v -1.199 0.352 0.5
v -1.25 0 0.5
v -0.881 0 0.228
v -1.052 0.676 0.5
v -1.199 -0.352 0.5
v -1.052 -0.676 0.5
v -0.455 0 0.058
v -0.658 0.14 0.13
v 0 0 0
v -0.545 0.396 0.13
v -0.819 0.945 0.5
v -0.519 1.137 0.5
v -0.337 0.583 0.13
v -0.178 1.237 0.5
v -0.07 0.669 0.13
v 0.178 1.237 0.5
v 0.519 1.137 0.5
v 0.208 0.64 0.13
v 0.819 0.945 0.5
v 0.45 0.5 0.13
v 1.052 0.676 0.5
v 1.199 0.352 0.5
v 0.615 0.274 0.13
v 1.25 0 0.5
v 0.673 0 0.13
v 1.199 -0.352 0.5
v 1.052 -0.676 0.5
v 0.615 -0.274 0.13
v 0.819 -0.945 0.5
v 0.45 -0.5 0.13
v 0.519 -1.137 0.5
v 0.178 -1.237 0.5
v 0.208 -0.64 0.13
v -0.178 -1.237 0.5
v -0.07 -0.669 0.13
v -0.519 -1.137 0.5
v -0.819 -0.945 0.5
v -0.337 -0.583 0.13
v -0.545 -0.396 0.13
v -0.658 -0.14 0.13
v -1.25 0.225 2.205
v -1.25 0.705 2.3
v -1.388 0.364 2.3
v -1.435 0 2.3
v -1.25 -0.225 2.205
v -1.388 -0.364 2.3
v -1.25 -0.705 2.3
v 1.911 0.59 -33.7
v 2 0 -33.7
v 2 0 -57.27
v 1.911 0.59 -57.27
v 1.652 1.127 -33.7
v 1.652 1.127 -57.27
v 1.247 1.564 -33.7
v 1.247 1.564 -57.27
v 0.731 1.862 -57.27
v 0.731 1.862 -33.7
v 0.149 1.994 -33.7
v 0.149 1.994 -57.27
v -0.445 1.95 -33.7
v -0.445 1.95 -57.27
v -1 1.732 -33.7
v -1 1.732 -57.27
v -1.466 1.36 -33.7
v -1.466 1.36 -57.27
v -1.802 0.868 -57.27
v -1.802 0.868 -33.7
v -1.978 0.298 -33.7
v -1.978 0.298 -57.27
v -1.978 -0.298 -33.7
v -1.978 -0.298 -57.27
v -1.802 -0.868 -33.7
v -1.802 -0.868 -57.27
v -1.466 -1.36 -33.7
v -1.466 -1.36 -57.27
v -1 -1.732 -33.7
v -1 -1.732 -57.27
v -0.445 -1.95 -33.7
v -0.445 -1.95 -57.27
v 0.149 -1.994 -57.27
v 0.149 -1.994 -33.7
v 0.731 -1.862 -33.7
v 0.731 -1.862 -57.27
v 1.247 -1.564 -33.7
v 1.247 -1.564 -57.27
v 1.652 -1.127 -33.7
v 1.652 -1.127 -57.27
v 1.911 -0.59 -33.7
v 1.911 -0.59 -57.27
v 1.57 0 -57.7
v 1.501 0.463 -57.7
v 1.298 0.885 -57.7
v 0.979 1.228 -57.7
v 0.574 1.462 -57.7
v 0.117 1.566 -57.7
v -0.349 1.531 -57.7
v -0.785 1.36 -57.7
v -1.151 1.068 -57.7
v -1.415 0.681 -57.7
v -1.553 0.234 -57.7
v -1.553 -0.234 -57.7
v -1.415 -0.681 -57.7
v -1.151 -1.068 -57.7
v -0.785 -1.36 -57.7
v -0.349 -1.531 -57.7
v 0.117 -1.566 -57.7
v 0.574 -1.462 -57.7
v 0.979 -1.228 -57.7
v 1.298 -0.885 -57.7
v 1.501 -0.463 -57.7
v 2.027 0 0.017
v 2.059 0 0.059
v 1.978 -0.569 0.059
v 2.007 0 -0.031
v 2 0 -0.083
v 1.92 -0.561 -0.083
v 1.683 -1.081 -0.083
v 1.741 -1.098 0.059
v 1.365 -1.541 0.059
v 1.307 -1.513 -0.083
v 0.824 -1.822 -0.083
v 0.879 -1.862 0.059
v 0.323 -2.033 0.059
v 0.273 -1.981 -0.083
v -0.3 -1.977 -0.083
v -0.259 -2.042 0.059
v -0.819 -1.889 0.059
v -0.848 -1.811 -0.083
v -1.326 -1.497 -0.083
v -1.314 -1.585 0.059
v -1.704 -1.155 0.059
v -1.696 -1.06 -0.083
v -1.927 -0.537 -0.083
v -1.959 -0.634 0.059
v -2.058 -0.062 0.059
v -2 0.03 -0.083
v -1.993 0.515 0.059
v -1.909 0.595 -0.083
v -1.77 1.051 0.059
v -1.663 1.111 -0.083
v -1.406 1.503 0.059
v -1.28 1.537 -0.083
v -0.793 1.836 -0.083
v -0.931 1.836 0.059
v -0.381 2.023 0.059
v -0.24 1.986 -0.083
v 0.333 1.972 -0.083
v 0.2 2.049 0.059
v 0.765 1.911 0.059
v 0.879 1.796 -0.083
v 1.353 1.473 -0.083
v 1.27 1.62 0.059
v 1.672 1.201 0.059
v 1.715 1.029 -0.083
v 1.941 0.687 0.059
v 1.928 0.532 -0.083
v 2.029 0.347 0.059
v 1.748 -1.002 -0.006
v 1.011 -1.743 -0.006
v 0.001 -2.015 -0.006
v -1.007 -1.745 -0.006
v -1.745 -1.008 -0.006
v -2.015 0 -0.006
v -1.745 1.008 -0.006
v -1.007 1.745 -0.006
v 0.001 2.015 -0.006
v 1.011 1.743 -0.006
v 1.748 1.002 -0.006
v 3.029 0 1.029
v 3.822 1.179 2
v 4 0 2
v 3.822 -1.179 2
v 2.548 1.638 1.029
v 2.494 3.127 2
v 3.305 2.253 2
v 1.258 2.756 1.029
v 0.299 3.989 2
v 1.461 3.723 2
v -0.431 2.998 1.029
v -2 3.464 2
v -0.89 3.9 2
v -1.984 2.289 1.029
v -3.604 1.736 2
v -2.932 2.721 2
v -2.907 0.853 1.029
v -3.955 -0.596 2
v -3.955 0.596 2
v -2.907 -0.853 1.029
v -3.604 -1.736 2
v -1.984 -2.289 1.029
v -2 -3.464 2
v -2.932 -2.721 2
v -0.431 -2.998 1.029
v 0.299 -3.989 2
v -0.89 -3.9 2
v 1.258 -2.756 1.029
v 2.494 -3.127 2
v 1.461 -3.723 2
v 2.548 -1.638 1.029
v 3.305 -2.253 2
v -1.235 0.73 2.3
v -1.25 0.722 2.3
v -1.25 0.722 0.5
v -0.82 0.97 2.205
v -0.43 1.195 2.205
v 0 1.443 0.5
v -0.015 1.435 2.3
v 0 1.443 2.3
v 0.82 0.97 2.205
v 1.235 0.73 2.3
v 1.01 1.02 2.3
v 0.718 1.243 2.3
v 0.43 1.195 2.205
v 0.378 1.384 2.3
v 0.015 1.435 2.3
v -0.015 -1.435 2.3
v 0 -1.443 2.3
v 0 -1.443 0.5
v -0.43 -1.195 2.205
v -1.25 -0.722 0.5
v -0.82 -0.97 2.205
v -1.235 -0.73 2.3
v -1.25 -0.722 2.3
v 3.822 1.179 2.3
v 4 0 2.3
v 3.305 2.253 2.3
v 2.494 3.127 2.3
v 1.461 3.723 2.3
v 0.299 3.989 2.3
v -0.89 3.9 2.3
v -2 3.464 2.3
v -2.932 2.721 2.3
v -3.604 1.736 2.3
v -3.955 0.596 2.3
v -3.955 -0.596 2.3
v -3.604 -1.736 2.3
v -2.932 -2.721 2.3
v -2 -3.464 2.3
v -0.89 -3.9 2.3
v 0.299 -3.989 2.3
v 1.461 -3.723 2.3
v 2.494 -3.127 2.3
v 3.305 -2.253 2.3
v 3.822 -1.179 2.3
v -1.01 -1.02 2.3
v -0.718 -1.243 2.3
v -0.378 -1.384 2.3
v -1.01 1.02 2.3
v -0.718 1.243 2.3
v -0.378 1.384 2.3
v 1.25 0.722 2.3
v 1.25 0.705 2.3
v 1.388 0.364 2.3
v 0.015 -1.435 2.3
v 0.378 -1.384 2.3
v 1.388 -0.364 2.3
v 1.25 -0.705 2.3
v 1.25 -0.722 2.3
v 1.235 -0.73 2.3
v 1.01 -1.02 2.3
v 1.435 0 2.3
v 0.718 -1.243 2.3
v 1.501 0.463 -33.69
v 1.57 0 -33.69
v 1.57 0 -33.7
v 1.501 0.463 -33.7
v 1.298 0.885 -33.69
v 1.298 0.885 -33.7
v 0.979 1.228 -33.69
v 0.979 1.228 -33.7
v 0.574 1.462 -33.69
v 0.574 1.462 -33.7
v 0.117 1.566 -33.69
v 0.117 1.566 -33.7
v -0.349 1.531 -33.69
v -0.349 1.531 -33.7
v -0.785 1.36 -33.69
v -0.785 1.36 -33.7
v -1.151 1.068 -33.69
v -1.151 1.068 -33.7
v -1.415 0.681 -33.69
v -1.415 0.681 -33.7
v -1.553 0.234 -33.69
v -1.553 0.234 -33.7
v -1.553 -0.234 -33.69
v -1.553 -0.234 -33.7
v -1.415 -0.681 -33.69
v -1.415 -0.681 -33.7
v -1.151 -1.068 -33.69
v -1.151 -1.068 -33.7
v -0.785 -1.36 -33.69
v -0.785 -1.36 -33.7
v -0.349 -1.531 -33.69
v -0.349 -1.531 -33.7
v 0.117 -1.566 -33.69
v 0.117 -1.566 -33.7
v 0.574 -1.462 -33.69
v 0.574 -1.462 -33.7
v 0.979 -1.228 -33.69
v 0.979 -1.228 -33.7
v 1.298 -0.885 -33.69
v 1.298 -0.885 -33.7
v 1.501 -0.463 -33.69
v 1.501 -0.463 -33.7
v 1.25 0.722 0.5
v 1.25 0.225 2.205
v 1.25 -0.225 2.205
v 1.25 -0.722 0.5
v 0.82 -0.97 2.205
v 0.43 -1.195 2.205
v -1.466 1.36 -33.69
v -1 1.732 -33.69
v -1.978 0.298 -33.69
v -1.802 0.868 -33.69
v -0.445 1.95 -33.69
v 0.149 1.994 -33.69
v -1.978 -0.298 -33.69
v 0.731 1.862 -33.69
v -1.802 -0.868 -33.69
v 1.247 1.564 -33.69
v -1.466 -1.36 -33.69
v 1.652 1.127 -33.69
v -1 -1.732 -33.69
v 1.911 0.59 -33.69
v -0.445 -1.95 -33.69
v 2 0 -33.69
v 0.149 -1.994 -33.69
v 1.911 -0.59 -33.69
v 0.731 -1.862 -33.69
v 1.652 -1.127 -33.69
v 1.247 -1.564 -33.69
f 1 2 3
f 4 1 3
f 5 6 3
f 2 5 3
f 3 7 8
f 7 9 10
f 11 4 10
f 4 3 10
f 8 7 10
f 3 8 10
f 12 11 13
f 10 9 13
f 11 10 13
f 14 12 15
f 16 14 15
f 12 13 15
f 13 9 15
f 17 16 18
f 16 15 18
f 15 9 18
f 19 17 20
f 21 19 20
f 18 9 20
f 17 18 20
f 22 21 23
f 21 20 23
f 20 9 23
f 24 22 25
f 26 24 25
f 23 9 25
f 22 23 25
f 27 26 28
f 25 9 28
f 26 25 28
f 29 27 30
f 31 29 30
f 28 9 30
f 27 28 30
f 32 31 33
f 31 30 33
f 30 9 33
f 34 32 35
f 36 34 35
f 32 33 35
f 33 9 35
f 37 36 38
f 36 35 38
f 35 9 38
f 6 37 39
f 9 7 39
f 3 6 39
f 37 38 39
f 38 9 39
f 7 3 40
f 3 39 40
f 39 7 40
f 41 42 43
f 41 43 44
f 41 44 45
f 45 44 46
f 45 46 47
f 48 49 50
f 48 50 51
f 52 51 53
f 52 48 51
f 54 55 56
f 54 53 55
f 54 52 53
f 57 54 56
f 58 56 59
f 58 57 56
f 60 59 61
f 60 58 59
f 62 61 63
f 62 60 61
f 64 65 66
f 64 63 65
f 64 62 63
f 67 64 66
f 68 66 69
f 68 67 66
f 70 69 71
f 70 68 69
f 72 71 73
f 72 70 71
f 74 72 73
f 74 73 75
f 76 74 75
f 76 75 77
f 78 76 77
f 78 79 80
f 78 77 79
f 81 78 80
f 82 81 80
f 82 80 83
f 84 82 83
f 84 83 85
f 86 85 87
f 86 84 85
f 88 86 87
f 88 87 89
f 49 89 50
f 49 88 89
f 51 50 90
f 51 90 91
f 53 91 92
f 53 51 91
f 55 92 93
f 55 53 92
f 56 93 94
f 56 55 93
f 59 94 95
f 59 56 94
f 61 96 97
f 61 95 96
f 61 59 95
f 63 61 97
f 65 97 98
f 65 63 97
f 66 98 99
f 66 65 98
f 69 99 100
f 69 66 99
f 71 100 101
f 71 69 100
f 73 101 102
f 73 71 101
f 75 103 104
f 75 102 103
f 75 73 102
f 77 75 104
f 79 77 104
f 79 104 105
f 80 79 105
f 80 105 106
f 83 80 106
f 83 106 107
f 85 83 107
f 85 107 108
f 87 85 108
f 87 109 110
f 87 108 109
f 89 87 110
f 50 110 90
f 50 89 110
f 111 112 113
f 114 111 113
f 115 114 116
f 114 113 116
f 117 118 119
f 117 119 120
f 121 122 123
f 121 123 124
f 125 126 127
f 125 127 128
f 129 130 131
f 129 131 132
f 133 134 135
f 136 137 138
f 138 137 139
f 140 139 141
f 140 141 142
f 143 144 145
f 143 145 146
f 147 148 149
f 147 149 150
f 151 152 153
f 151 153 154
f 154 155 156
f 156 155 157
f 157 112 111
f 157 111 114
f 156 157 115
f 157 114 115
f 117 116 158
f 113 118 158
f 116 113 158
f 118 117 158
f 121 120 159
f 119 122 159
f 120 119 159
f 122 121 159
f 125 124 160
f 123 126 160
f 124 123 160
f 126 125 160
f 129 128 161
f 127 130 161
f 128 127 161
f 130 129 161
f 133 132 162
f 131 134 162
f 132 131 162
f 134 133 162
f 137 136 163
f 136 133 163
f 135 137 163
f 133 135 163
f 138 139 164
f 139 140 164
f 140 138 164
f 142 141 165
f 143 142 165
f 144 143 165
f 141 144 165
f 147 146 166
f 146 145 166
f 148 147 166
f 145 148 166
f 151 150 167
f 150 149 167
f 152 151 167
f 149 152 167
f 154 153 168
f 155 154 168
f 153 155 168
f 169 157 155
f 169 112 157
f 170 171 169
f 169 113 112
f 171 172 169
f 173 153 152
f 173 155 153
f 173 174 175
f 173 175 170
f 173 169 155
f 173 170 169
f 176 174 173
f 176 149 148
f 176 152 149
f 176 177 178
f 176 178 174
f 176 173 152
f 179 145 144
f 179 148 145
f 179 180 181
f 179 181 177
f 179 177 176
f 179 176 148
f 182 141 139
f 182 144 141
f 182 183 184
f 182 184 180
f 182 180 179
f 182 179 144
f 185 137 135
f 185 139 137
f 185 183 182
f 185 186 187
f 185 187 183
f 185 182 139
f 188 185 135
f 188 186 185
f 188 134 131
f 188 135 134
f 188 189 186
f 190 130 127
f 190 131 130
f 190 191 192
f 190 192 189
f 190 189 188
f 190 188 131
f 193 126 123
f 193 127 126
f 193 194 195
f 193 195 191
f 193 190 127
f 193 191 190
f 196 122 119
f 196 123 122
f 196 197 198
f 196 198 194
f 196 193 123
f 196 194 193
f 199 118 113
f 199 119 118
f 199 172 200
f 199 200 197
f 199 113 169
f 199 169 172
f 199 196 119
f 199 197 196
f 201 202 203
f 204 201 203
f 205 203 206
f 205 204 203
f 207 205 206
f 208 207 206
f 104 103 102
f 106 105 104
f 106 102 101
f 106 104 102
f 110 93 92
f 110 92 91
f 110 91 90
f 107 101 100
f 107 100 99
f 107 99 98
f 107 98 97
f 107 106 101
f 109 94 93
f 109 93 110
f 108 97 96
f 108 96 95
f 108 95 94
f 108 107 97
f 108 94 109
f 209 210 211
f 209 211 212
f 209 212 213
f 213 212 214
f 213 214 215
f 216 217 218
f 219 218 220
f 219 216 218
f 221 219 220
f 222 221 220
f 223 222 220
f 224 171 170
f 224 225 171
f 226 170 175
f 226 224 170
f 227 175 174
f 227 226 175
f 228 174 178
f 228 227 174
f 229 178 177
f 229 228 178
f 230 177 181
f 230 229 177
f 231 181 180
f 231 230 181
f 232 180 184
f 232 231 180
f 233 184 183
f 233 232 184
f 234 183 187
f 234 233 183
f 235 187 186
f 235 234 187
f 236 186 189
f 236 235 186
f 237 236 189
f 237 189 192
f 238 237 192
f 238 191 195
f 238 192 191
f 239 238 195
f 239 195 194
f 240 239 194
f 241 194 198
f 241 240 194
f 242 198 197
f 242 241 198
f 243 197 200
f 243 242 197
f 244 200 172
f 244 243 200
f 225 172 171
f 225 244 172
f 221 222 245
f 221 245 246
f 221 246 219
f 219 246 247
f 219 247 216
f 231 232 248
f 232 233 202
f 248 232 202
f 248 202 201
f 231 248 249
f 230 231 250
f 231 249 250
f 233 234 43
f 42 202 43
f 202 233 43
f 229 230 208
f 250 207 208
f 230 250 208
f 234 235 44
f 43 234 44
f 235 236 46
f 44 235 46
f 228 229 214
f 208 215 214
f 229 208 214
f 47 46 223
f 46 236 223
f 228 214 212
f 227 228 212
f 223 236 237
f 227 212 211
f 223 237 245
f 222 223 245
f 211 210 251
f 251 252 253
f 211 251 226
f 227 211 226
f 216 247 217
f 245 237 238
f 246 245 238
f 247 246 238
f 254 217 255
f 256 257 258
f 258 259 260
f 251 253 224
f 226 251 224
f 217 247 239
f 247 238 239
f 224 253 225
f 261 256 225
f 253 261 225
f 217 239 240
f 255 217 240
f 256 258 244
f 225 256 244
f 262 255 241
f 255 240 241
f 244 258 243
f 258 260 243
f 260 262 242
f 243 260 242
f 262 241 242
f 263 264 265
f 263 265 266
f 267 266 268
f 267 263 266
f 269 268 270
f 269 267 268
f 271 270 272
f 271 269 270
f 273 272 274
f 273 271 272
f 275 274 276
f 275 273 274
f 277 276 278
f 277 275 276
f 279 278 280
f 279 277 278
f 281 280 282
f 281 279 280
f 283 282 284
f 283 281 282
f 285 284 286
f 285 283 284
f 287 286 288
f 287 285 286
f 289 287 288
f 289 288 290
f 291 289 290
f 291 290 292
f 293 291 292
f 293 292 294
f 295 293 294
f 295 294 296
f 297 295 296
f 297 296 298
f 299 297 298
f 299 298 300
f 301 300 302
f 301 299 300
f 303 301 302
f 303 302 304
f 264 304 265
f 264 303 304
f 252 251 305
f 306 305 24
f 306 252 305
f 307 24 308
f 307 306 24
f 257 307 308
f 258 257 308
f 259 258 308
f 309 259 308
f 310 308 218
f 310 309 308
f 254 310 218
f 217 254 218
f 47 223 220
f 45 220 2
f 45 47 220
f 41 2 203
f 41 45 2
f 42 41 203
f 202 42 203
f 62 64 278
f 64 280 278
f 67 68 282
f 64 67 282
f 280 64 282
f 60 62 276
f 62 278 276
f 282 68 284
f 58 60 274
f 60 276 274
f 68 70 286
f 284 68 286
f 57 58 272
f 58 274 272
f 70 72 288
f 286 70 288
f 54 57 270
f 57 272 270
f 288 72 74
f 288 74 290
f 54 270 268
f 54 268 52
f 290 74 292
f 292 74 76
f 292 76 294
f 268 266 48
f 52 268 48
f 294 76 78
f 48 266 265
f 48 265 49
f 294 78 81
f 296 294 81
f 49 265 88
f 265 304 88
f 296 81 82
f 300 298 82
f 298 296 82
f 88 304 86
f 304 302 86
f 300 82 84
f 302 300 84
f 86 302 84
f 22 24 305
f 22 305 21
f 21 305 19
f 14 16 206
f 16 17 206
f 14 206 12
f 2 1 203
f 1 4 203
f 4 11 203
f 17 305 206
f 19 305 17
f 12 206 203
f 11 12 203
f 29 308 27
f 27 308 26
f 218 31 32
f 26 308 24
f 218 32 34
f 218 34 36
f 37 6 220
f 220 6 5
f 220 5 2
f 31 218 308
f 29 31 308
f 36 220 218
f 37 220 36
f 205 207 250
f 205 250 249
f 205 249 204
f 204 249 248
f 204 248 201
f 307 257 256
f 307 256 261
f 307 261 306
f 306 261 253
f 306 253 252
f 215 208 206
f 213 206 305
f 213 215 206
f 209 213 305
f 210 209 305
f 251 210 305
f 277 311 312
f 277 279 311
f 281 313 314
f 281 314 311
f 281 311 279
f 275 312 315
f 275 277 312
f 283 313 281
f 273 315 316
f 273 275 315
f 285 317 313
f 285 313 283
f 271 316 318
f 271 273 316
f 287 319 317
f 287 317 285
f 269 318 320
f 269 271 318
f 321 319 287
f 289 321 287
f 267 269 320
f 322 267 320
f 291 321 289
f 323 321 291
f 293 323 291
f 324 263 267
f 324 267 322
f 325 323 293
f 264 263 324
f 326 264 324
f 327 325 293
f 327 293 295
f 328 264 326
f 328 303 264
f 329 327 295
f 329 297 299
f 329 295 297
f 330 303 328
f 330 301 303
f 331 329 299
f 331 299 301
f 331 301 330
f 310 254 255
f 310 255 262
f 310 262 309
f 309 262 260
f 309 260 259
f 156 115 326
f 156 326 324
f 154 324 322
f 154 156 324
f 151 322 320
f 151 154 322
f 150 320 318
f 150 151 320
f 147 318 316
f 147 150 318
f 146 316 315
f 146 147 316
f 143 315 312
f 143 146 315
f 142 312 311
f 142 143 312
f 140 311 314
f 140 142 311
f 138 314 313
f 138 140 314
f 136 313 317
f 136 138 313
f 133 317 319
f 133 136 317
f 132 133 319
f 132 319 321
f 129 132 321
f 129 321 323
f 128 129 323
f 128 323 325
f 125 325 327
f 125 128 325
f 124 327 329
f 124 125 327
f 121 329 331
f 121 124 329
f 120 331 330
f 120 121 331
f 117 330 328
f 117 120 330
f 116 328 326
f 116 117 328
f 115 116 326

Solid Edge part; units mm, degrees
sketch "Sketch1" plane through (0, 0, 0) normal (0, -1, 0) x (1, 0, 0)
  line L0 (2, 0) -> (4, 2)
  line L1 (4, 2) -> (4, 2.3)
  line L2 (4, 2.3) -> (0, 2.3)
  line L3 (0, 2.3) -> (0, -57.7)
  line L4 (0, -57.7) -> (1.5705, -57.7)
  line L5 (1.5705, -57.7) -> (2, -57.2705)
  line L6 (2, -57.2705) -> (2, -33.7)
  line L7 (2, -33.7) -> (1.5705, -33.7)
  line L8 (1.5705, -33.7) -> (1.5705, -33.69)
  line L9 (1.5705, -33.69) -> (2, -33.69)
  line L10 (2, -33.69) -> (2, 0)
  dimension "D1" = 4
  dimension "D2" = 2.3
  dimension "D3" = 0.01
  dimension "D4" = 1.5705
  dimension "D5" = 36
  dimension "D6" = 0.3
  dimension "D7" = 60
revolve "RevolvedProtrusion1" add sketch "Sketch1" angle 360 about axis through (0, 0, 54) along (0, 0, -1)
sketch "Sketch2" plane through (0, 0, 0) normal (0, -1, 0) x (1, 0, 0)
  arc A0 (-1.25, 0.5) -> (0, 0) centre (0, 1.8125) ccw
  line L0 (0, 0.5) -> (0, 0)
  line L1 (-1.25, 0.5) -> (0, 0.5)
  dimension "D1" = 48.2
revolve "RevolvedCutout1" cut sketch "Sketch2" angle 360 about axis through (0, 0, 54) along (0, 0, -1)
sketch "Sketch3" plane through (0, 0, 2.3) normal (0, 0, 1) x (0, -1, 0)
  line L0 (-1.4434, 0) -> (-0.7217, 1.25)
  line L1 (-0.7217, 1.25) -> (0.7217, 1.25)
  line L2 (0.7217, 1.25) -> (1.4434, 0)
  line L3 (1.4434, 0) -> (0.7217, -1.25)
  line L4 (0.7217, -1.25) -> (-0.7217, -1.25)
  line L5 (-0.7217, -1.25) -> (-1.4434, 0)
  dimension "D1" = 2.5
extrude "Cutout1" cut sketch "Sketch3" against normal blind 1.8
cosmetic_thread "Thread1" size "M4"
sketch "Sketch4" plane through (0, 0, 0) normal (1, 0, 0) x (0, 1, 0)
  line L0 (-1.435, 2.3) -> (0, 1.4715)
revolve "RevolvedCutout2" cut sketch "Sketch4" angle 360 about axis through (0, 0, -57) along (0, 0, 1) material side at (0, -0.6925, 1.9291)
fillet "Round1" radius 0.2 1 edges at (-2, 0, 0)
properties material "Stahl"
